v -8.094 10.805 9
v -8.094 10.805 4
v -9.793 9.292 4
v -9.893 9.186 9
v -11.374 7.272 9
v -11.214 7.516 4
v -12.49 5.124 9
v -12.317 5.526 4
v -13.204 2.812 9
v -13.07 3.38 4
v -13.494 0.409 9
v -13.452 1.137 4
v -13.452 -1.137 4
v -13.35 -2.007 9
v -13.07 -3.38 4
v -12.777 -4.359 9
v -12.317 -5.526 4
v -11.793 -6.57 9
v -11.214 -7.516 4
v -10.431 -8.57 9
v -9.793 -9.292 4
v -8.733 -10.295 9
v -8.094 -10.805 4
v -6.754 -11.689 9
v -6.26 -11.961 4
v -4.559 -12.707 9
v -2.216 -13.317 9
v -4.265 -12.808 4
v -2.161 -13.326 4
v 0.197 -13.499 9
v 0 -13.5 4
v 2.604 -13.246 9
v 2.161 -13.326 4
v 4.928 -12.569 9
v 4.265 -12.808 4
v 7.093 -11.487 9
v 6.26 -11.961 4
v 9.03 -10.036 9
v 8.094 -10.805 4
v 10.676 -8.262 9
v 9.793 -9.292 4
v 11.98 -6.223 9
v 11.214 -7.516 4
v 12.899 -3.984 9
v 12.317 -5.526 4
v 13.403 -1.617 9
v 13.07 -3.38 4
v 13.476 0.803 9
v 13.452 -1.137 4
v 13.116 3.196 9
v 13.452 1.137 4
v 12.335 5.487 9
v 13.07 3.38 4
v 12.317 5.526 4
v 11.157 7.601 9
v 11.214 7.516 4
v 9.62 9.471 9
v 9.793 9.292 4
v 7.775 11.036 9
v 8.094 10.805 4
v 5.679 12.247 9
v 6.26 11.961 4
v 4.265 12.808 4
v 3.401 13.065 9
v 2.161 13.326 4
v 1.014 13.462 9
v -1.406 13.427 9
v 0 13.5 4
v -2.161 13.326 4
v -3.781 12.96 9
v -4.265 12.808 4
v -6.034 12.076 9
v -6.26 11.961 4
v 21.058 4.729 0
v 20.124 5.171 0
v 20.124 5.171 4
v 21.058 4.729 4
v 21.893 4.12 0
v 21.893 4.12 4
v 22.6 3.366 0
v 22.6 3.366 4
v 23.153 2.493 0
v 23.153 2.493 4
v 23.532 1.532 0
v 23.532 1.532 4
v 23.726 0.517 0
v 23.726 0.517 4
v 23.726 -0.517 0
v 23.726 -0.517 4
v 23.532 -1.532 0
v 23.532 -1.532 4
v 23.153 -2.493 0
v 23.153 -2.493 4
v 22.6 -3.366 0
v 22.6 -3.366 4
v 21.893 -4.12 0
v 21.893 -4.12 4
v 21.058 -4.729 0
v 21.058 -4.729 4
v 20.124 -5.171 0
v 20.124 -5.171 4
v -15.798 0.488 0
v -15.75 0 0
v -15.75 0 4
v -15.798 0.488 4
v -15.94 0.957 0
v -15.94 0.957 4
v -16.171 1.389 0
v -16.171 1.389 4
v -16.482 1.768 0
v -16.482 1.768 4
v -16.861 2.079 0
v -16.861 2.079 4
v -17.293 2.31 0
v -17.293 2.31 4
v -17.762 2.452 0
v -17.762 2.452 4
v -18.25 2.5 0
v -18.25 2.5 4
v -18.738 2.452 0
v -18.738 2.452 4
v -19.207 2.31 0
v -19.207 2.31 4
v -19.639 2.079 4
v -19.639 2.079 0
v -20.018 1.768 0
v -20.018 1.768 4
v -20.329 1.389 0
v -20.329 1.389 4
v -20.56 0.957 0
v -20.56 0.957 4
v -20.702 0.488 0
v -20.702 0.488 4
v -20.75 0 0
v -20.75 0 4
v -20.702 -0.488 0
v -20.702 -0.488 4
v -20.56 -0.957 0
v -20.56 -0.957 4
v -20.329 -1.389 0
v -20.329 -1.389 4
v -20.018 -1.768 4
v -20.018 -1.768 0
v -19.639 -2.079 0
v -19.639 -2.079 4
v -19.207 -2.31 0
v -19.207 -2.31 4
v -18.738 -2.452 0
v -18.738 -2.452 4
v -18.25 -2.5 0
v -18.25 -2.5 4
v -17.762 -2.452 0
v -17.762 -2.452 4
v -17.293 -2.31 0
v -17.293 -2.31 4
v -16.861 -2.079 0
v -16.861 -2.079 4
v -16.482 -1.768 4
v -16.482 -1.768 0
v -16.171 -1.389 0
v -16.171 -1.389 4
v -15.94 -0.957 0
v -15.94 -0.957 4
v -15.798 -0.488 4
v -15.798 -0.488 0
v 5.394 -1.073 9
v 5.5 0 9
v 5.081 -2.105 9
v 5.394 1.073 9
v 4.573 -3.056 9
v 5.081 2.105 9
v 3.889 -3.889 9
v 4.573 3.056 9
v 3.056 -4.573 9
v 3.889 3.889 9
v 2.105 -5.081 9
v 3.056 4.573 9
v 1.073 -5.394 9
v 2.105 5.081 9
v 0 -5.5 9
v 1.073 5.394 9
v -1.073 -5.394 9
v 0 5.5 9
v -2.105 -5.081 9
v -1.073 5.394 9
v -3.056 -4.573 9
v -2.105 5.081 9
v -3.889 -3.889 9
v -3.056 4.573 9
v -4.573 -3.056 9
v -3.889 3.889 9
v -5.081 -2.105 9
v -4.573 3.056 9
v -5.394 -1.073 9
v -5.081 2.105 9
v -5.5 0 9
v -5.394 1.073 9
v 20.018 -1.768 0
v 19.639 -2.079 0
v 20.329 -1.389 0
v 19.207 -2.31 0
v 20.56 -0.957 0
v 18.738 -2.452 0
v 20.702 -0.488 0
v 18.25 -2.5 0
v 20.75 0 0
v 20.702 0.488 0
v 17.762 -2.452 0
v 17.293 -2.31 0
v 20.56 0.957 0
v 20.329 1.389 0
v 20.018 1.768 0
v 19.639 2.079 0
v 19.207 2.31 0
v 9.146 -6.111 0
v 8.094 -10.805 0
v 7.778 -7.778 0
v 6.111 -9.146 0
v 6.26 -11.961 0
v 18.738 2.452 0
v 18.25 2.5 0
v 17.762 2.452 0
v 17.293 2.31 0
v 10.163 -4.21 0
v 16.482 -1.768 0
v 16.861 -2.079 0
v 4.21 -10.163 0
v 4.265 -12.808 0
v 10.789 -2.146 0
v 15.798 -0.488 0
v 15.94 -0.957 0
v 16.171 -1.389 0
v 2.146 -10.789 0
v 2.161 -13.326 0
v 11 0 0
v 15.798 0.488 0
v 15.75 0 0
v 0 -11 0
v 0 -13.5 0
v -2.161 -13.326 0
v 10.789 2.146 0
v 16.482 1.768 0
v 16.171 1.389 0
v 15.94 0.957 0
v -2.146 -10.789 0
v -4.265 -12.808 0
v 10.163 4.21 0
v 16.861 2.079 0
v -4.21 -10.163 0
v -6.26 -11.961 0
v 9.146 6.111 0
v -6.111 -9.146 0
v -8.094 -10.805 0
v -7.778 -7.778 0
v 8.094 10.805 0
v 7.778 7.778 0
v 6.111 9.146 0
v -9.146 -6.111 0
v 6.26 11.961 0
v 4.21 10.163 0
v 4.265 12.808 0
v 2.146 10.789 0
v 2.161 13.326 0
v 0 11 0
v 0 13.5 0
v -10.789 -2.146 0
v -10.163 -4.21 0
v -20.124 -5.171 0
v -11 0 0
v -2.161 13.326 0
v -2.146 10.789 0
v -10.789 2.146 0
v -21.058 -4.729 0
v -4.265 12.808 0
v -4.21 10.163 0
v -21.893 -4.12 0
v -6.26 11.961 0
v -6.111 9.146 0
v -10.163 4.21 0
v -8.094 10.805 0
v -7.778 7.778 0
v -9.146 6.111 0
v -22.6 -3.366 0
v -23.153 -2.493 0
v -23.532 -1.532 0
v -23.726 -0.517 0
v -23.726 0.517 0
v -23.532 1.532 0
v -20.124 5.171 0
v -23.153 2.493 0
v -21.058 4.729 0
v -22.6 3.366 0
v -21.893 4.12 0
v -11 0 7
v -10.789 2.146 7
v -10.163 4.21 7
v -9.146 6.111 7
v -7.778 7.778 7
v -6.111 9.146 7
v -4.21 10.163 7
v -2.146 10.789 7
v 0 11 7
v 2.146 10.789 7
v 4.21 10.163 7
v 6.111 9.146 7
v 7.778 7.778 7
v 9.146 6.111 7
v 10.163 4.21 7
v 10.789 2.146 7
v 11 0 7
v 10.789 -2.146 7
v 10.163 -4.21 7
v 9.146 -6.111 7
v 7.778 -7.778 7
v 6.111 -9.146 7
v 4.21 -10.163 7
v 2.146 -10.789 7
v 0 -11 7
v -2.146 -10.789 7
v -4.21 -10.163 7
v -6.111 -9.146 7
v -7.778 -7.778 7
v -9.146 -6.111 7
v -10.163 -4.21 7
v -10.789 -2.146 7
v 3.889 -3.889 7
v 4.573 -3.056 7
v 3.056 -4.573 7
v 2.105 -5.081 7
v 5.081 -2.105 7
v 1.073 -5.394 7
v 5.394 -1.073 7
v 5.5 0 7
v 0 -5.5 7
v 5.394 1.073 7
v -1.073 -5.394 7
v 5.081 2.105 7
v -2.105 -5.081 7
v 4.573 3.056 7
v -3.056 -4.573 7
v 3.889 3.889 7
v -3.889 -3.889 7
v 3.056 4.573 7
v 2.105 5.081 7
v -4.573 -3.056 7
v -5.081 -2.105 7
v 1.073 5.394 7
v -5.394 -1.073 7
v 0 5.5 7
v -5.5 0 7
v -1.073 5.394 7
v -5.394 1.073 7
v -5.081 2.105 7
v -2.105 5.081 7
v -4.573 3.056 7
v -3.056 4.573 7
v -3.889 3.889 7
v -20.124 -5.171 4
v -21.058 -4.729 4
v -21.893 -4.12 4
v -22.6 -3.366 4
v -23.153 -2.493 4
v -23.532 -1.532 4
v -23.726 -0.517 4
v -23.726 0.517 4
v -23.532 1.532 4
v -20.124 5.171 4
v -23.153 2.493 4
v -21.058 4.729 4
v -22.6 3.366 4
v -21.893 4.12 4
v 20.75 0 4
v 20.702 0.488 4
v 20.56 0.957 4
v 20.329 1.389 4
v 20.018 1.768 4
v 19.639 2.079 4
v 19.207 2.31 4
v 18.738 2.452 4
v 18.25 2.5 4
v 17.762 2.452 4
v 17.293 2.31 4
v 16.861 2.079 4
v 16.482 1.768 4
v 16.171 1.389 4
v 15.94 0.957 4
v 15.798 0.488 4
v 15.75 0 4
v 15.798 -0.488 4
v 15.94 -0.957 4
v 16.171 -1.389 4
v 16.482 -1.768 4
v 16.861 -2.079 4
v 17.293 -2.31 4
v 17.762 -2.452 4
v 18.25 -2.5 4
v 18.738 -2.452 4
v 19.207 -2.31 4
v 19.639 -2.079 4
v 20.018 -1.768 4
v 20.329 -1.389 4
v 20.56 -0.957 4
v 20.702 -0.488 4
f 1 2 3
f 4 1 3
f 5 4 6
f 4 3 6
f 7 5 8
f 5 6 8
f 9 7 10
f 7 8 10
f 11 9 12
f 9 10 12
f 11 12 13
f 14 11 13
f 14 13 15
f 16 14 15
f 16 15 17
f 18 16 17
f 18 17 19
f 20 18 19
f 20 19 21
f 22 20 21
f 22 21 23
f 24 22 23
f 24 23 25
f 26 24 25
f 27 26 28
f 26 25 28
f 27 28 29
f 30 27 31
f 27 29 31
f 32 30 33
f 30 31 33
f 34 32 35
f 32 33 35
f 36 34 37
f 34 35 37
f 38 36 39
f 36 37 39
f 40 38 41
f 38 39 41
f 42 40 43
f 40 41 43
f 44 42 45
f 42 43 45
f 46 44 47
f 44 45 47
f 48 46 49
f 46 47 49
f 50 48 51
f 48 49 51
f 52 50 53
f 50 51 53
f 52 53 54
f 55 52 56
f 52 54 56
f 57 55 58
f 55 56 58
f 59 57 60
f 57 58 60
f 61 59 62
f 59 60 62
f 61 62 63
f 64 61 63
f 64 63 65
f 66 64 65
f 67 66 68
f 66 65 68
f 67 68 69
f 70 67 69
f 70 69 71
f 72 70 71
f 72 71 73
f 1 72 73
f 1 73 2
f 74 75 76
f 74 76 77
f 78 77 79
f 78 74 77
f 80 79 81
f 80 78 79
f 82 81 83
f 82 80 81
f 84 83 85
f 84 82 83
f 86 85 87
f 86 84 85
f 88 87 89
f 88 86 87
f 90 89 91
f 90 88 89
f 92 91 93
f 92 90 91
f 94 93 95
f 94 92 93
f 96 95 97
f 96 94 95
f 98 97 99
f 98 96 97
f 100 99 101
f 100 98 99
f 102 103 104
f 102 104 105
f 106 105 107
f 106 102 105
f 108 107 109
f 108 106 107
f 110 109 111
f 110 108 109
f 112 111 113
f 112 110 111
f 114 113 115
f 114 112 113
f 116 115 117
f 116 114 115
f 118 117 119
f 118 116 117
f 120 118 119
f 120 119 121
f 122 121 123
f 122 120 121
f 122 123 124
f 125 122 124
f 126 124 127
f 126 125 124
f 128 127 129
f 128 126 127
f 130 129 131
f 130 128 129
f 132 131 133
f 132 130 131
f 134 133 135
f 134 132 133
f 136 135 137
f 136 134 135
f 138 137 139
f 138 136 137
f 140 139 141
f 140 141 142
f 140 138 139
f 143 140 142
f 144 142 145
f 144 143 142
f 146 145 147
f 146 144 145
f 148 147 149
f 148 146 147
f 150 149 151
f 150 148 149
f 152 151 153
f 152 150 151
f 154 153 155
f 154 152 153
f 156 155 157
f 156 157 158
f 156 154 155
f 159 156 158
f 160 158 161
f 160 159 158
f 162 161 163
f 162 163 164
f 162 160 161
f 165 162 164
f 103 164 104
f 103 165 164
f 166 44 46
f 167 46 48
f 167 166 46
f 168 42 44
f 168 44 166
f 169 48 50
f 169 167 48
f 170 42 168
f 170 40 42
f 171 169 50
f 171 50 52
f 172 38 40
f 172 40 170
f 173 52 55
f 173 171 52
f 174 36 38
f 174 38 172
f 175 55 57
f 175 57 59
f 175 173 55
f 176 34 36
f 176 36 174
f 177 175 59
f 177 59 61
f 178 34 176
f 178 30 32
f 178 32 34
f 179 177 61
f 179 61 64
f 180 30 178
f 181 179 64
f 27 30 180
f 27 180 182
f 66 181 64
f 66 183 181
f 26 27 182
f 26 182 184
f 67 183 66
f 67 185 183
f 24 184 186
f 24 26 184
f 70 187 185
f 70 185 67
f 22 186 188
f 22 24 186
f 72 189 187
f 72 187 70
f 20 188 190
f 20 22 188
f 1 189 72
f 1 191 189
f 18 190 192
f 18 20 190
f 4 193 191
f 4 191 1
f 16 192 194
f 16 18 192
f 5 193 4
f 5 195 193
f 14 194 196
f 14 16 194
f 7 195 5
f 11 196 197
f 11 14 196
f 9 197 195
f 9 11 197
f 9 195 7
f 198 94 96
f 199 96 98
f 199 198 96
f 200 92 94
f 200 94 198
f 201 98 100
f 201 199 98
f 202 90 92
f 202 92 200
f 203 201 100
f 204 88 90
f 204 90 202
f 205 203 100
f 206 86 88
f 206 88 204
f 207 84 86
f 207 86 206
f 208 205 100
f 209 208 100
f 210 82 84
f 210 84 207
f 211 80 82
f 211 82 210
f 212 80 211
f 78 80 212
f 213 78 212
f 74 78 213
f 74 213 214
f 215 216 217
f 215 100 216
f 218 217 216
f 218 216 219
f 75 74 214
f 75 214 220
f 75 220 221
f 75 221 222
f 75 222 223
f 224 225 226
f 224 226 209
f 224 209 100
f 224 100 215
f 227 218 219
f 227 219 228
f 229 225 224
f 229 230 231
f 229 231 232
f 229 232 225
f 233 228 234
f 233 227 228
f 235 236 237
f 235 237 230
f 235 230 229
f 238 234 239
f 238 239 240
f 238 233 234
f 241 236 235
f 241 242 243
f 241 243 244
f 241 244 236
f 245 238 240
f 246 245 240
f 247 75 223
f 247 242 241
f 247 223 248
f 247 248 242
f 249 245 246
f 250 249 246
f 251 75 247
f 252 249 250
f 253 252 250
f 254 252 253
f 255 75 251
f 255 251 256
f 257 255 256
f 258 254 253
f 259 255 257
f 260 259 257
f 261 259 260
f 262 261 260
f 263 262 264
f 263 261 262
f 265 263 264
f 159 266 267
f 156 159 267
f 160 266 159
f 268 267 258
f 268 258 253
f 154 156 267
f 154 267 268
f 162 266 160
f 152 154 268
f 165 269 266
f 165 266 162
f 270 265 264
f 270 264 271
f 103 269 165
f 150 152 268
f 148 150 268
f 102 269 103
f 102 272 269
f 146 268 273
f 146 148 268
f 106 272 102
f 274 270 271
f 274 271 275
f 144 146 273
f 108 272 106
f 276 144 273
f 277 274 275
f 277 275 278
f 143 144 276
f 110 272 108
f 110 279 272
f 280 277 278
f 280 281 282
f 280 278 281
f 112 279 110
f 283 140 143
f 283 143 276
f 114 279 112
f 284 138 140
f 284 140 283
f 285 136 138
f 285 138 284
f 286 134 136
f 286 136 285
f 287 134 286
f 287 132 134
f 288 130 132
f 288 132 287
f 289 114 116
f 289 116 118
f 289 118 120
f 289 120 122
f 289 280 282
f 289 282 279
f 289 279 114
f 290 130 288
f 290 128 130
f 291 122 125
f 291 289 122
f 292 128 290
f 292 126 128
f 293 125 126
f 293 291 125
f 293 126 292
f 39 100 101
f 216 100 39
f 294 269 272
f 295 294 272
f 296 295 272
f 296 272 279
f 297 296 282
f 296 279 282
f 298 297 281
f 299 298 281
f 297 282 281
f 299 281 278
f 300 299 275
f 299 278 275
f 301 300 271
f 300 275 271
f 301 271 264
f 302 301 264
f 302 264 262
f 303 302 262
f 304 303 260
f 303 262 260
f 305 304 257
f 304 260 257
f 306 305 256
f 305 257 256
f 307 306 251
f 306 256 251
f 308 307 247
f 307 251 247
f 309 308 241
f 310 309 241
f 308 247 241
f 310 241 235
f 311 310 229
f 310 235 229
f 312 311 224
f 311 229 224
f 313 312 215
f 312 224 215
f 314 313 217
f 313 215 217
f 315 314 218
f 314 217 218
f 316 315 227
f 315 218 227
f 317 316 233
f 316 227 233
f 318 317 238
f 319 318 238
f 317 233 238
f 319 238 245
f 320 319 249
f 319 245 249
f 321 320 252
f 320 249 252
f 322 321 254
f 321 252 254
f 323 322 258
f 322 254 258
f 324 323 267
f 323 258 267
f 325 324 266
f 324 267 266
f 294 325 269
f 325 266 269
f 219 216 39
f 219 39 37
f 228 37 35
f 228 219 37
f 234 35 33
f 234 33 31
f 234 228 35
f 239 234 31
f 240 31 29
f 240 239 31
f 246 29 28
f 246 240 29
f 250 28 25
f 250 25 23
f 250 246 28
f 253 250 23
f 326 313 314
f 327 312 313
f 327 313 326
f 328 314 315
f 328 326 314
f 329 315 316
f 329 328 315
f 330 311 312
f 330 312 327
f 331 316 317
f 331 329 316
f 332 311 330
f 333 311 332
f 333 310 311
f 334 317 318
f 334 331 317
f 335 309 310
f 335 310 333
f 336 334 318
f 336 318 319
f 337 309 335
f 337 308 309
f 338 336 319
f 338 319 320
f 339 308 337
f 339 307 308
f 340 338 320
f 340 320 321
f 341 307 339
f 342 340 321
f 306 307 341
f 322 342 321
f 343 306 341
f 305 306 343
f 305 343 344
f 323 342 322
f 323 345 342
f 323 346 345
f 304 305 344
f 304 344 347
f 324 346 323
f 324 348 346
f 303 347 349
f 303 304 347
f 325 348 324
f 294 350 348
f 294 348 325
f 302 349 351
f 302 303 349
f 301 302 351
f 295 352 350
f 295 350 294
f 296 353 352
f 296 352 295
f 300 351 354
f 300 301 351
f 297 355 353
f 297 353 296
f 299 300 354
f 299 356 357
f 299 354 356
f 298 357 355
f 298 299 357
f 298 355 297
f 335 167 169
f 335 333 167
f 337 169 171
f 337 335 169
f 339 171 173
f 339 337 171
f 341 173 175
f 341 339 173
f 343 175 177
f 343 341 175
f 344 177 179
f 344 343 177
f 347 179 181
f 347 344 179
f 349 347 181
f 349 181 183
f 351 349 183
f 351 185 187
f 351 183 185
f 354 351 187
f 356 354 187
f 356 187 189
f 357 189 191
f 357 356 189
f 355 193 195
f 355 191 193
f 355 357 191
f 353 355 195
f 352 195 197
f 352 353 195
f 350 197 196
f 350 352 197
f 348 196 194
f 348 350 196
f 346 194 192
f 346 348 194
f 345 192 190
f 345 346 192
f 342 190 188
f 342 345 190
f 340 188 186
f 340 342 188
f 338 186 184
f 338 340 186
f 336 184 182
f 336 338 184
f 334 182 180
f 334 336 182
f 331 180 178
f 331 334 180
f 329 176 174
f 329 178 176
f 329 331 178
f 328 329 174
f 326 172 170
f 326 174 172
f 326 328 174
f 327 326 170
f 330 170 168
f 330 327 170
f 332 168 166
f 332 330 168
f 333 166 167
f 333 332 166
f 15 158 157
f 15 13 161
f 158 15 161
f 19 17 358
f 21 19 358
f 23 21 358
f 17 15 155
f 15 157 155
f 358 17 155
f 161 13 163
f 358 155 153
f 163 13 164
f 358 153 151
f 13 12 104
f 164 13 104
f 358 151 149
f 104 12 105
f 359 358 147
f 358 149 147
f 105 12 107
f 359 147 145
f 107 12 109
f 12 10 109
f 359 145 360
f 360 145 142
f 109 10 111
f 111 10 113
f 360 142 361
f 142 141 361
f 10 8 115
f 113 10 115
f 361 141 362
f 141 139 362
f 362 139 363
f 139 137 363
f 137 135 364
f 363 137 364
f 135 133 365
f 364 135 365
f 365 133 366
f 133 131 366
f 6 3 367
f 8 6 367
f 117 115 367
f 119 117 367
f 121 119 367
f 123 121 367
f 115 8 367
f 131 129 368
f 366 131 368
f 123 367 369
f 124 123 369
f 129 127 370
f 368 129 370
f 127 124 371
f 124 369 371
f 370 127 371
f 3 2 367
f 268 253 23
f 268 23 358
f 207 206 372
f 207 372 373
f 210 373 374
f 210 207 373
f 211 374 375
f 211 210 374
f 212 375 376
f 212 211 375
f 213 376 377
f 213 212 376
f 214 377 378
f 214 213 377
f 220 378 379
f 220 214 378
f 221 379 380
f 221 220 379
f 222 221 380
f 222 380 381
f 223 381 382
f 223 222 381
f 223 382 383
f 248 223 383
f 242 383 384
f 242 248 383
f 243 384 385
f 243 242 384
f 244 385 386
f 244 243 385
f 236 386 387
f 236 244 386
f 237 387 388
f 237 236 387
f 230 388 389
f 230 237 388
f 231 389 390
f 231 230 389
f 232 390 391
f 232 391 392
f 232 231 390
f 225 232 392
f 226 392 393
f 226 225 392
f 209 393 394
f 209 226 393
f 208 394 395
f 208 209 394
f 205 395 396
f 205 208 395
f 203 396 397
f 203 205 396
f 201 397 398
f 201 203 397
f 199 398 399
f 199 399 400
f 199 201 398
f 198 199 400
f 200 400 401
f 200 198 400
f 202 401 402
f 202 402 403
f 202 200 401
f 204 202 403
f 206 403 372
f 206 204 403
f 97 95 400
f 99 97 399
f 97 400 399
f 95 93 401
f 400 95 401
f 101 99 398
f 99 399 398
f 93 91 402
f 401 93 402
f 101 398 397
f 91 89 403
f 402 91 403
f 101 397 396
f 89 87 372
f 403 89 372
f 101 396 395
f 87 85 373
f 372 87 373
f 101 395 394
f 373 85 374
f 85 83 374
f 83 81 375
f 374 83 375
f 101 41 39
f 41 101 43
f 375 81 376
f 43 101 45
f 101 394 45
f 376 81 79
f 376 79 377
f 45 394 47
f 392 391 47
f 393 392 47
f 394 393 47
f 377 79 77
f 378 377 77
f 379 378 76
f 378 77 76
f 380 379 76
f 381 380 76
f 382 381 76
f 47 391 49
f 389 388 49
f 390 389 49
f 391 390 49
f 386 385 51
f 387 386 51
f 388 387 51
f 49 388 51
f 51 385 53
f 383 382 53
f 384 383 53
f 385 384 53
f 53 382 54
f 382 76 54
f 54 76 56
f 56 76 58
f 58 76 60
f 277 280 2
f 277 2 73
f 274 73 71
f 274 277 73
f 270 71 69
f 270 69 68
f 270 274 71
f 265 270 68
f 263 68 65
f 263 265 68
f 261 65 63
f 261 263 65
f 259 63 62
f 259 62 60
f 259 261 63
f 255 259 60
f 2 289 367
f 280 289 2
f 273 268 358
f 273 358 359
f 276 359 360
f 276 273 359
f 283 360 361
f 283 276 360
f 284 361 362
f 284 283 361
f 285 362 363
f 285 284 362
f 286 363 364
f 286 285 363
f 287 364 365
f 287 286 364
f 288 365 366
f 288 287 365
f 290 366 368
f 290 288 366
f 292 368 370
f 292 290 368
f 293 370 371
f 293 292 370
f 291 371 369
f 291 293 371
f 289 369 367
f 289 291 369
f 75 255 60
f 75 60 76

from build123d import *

# Parameters (mm, degrees)
ESBO_O1_R                = 4
ESBO_O1_R_2              = 2.5
RESSALTO_EXTRUS_O1_DEPTH = 4
ESBO_O2_R                = 12.015701032
ESBO_O2_R_2              = 10.48384183
RESSALTO_EXTRUS_O2_DEPTH = 5
ESBO_O3_R                = 5.5
ESBO_O3_R_2              = 4
RESSALTO_EXTRUS_O3_DEPTH = 9
BOSS_EXTRUDE1_START      = -5
SKETCH1_R                = 13.5
BOSS_EXTRUDE1_DEPTH      = 5
SKETCH2_R                = 11
CUT_EXTRUDE1_DEPTH       = 7
CUT_EXTRUDE2_START       = -7
SKETCH3_R                = 5.5
CUT_EXTRUDE2_DEPTH       = 7


with BuildPart() as part:
    # Esboço1 → Ressalto-extrusão1 (new body)
    with BuildSketch(Plane.XY):
        with BuildLine():
            Line((-20.12399727, 5.170892982), (-8.093718556, 10.80470823))
            ThreePointArc((-8.093718556, 10.80470823), (0, 13.5), (8.093718556, 10.80470823))
            Line((8.093718556, 10.80470823), (20.12399727, 5.170892982))
            ThreePointArc((20.12399727, 5.170892982), (23.75, 0), (20.12399727, -5.170892982))
            Line((20.12399727, -5.170892982), (8.093718556, -10.80470823))
            ThreePointArc((8.093718556, -10.80470823), (0, -13.5), (-8.093718556, -10.80470823))
            Line((-8.093718556, -10.80470823), (-20.12399727, -5.170892982))
            ThreePointArc((-20.12399727, -5.170892982), (-23.75, 0), (-20.12399727, 5.170892982))
        make_face()
        Circle(ESBO_O1_R, mode=Mode.SUBTRACT)
        with Locations((-18.25, 0)):
            Circle(ESBO_O1_R_2, mode=Mode.SUBTRACT)
        with Locations((18.25, 0)):
            Circle(ESBO_O1_R_2, mode=Mode.SUBTRACT)
    extrude(amount=RESSALTO_EXTRUS_O1_DEPTH)

    # Esboço2 → Ressalto-extrusão2 (add)
    with BuildSketch(Plane.XY.offset(4)):
        Circle(ESBO_O2_R)
        Circle(ESBO_O2_R_2, mode=Mode.SUBTRACT)
    extrude(amount=RESSALTO_EXTRUS_O2_DEPTH)

    # Esboço3 → Ressalto-extrusão3 (add)
    with BuildSketch(Plane.XY.offset(4)):
        Circle(ESBO_O3_R)
        Circle(ESBO_O3_R_2, mode=Mode.SUBTRACT)
    extrude(amount=RESSALTO_EXTRUS_O3_DEPTH)

    # Sketch1 → Boss-Extrude1 (add)
    with BuildSketch(Plane.XY.offset(9).offset(BOSS_EXTRUDE1_START)):
        with Locations(Location((0, 0, 0), (0, 0, 126.836580816))):
            Circle(SKETCH1_R)
    extrude(amount=BOSS_EXTRUDE1_DEPTH)

    # Sketch2 → Cut-Extrude1 (cut)
    with BuildSketch(Plane(origin=(0, 0, 0), x_dir=(-1, 0, 0), z_dir=(0, 0, -1))):
        Circle(SKETCH2_R)
    extrude(amount=-CUT_EXTRUDE1_DEPTH, mode=Mode.SUBTRACT)

    # Sketch3 → Cut-Extrude2 (cut)
    with BuildSketch(Plane.XY.offset(13).offset(CUT_EXTRUDE2_START)):
        Circle(SKETCH3_R)
    extrude(amount=CUT_EXTRUDE2_DEPTH, mode=Mode.SUBTRACT)


solid = part.part
